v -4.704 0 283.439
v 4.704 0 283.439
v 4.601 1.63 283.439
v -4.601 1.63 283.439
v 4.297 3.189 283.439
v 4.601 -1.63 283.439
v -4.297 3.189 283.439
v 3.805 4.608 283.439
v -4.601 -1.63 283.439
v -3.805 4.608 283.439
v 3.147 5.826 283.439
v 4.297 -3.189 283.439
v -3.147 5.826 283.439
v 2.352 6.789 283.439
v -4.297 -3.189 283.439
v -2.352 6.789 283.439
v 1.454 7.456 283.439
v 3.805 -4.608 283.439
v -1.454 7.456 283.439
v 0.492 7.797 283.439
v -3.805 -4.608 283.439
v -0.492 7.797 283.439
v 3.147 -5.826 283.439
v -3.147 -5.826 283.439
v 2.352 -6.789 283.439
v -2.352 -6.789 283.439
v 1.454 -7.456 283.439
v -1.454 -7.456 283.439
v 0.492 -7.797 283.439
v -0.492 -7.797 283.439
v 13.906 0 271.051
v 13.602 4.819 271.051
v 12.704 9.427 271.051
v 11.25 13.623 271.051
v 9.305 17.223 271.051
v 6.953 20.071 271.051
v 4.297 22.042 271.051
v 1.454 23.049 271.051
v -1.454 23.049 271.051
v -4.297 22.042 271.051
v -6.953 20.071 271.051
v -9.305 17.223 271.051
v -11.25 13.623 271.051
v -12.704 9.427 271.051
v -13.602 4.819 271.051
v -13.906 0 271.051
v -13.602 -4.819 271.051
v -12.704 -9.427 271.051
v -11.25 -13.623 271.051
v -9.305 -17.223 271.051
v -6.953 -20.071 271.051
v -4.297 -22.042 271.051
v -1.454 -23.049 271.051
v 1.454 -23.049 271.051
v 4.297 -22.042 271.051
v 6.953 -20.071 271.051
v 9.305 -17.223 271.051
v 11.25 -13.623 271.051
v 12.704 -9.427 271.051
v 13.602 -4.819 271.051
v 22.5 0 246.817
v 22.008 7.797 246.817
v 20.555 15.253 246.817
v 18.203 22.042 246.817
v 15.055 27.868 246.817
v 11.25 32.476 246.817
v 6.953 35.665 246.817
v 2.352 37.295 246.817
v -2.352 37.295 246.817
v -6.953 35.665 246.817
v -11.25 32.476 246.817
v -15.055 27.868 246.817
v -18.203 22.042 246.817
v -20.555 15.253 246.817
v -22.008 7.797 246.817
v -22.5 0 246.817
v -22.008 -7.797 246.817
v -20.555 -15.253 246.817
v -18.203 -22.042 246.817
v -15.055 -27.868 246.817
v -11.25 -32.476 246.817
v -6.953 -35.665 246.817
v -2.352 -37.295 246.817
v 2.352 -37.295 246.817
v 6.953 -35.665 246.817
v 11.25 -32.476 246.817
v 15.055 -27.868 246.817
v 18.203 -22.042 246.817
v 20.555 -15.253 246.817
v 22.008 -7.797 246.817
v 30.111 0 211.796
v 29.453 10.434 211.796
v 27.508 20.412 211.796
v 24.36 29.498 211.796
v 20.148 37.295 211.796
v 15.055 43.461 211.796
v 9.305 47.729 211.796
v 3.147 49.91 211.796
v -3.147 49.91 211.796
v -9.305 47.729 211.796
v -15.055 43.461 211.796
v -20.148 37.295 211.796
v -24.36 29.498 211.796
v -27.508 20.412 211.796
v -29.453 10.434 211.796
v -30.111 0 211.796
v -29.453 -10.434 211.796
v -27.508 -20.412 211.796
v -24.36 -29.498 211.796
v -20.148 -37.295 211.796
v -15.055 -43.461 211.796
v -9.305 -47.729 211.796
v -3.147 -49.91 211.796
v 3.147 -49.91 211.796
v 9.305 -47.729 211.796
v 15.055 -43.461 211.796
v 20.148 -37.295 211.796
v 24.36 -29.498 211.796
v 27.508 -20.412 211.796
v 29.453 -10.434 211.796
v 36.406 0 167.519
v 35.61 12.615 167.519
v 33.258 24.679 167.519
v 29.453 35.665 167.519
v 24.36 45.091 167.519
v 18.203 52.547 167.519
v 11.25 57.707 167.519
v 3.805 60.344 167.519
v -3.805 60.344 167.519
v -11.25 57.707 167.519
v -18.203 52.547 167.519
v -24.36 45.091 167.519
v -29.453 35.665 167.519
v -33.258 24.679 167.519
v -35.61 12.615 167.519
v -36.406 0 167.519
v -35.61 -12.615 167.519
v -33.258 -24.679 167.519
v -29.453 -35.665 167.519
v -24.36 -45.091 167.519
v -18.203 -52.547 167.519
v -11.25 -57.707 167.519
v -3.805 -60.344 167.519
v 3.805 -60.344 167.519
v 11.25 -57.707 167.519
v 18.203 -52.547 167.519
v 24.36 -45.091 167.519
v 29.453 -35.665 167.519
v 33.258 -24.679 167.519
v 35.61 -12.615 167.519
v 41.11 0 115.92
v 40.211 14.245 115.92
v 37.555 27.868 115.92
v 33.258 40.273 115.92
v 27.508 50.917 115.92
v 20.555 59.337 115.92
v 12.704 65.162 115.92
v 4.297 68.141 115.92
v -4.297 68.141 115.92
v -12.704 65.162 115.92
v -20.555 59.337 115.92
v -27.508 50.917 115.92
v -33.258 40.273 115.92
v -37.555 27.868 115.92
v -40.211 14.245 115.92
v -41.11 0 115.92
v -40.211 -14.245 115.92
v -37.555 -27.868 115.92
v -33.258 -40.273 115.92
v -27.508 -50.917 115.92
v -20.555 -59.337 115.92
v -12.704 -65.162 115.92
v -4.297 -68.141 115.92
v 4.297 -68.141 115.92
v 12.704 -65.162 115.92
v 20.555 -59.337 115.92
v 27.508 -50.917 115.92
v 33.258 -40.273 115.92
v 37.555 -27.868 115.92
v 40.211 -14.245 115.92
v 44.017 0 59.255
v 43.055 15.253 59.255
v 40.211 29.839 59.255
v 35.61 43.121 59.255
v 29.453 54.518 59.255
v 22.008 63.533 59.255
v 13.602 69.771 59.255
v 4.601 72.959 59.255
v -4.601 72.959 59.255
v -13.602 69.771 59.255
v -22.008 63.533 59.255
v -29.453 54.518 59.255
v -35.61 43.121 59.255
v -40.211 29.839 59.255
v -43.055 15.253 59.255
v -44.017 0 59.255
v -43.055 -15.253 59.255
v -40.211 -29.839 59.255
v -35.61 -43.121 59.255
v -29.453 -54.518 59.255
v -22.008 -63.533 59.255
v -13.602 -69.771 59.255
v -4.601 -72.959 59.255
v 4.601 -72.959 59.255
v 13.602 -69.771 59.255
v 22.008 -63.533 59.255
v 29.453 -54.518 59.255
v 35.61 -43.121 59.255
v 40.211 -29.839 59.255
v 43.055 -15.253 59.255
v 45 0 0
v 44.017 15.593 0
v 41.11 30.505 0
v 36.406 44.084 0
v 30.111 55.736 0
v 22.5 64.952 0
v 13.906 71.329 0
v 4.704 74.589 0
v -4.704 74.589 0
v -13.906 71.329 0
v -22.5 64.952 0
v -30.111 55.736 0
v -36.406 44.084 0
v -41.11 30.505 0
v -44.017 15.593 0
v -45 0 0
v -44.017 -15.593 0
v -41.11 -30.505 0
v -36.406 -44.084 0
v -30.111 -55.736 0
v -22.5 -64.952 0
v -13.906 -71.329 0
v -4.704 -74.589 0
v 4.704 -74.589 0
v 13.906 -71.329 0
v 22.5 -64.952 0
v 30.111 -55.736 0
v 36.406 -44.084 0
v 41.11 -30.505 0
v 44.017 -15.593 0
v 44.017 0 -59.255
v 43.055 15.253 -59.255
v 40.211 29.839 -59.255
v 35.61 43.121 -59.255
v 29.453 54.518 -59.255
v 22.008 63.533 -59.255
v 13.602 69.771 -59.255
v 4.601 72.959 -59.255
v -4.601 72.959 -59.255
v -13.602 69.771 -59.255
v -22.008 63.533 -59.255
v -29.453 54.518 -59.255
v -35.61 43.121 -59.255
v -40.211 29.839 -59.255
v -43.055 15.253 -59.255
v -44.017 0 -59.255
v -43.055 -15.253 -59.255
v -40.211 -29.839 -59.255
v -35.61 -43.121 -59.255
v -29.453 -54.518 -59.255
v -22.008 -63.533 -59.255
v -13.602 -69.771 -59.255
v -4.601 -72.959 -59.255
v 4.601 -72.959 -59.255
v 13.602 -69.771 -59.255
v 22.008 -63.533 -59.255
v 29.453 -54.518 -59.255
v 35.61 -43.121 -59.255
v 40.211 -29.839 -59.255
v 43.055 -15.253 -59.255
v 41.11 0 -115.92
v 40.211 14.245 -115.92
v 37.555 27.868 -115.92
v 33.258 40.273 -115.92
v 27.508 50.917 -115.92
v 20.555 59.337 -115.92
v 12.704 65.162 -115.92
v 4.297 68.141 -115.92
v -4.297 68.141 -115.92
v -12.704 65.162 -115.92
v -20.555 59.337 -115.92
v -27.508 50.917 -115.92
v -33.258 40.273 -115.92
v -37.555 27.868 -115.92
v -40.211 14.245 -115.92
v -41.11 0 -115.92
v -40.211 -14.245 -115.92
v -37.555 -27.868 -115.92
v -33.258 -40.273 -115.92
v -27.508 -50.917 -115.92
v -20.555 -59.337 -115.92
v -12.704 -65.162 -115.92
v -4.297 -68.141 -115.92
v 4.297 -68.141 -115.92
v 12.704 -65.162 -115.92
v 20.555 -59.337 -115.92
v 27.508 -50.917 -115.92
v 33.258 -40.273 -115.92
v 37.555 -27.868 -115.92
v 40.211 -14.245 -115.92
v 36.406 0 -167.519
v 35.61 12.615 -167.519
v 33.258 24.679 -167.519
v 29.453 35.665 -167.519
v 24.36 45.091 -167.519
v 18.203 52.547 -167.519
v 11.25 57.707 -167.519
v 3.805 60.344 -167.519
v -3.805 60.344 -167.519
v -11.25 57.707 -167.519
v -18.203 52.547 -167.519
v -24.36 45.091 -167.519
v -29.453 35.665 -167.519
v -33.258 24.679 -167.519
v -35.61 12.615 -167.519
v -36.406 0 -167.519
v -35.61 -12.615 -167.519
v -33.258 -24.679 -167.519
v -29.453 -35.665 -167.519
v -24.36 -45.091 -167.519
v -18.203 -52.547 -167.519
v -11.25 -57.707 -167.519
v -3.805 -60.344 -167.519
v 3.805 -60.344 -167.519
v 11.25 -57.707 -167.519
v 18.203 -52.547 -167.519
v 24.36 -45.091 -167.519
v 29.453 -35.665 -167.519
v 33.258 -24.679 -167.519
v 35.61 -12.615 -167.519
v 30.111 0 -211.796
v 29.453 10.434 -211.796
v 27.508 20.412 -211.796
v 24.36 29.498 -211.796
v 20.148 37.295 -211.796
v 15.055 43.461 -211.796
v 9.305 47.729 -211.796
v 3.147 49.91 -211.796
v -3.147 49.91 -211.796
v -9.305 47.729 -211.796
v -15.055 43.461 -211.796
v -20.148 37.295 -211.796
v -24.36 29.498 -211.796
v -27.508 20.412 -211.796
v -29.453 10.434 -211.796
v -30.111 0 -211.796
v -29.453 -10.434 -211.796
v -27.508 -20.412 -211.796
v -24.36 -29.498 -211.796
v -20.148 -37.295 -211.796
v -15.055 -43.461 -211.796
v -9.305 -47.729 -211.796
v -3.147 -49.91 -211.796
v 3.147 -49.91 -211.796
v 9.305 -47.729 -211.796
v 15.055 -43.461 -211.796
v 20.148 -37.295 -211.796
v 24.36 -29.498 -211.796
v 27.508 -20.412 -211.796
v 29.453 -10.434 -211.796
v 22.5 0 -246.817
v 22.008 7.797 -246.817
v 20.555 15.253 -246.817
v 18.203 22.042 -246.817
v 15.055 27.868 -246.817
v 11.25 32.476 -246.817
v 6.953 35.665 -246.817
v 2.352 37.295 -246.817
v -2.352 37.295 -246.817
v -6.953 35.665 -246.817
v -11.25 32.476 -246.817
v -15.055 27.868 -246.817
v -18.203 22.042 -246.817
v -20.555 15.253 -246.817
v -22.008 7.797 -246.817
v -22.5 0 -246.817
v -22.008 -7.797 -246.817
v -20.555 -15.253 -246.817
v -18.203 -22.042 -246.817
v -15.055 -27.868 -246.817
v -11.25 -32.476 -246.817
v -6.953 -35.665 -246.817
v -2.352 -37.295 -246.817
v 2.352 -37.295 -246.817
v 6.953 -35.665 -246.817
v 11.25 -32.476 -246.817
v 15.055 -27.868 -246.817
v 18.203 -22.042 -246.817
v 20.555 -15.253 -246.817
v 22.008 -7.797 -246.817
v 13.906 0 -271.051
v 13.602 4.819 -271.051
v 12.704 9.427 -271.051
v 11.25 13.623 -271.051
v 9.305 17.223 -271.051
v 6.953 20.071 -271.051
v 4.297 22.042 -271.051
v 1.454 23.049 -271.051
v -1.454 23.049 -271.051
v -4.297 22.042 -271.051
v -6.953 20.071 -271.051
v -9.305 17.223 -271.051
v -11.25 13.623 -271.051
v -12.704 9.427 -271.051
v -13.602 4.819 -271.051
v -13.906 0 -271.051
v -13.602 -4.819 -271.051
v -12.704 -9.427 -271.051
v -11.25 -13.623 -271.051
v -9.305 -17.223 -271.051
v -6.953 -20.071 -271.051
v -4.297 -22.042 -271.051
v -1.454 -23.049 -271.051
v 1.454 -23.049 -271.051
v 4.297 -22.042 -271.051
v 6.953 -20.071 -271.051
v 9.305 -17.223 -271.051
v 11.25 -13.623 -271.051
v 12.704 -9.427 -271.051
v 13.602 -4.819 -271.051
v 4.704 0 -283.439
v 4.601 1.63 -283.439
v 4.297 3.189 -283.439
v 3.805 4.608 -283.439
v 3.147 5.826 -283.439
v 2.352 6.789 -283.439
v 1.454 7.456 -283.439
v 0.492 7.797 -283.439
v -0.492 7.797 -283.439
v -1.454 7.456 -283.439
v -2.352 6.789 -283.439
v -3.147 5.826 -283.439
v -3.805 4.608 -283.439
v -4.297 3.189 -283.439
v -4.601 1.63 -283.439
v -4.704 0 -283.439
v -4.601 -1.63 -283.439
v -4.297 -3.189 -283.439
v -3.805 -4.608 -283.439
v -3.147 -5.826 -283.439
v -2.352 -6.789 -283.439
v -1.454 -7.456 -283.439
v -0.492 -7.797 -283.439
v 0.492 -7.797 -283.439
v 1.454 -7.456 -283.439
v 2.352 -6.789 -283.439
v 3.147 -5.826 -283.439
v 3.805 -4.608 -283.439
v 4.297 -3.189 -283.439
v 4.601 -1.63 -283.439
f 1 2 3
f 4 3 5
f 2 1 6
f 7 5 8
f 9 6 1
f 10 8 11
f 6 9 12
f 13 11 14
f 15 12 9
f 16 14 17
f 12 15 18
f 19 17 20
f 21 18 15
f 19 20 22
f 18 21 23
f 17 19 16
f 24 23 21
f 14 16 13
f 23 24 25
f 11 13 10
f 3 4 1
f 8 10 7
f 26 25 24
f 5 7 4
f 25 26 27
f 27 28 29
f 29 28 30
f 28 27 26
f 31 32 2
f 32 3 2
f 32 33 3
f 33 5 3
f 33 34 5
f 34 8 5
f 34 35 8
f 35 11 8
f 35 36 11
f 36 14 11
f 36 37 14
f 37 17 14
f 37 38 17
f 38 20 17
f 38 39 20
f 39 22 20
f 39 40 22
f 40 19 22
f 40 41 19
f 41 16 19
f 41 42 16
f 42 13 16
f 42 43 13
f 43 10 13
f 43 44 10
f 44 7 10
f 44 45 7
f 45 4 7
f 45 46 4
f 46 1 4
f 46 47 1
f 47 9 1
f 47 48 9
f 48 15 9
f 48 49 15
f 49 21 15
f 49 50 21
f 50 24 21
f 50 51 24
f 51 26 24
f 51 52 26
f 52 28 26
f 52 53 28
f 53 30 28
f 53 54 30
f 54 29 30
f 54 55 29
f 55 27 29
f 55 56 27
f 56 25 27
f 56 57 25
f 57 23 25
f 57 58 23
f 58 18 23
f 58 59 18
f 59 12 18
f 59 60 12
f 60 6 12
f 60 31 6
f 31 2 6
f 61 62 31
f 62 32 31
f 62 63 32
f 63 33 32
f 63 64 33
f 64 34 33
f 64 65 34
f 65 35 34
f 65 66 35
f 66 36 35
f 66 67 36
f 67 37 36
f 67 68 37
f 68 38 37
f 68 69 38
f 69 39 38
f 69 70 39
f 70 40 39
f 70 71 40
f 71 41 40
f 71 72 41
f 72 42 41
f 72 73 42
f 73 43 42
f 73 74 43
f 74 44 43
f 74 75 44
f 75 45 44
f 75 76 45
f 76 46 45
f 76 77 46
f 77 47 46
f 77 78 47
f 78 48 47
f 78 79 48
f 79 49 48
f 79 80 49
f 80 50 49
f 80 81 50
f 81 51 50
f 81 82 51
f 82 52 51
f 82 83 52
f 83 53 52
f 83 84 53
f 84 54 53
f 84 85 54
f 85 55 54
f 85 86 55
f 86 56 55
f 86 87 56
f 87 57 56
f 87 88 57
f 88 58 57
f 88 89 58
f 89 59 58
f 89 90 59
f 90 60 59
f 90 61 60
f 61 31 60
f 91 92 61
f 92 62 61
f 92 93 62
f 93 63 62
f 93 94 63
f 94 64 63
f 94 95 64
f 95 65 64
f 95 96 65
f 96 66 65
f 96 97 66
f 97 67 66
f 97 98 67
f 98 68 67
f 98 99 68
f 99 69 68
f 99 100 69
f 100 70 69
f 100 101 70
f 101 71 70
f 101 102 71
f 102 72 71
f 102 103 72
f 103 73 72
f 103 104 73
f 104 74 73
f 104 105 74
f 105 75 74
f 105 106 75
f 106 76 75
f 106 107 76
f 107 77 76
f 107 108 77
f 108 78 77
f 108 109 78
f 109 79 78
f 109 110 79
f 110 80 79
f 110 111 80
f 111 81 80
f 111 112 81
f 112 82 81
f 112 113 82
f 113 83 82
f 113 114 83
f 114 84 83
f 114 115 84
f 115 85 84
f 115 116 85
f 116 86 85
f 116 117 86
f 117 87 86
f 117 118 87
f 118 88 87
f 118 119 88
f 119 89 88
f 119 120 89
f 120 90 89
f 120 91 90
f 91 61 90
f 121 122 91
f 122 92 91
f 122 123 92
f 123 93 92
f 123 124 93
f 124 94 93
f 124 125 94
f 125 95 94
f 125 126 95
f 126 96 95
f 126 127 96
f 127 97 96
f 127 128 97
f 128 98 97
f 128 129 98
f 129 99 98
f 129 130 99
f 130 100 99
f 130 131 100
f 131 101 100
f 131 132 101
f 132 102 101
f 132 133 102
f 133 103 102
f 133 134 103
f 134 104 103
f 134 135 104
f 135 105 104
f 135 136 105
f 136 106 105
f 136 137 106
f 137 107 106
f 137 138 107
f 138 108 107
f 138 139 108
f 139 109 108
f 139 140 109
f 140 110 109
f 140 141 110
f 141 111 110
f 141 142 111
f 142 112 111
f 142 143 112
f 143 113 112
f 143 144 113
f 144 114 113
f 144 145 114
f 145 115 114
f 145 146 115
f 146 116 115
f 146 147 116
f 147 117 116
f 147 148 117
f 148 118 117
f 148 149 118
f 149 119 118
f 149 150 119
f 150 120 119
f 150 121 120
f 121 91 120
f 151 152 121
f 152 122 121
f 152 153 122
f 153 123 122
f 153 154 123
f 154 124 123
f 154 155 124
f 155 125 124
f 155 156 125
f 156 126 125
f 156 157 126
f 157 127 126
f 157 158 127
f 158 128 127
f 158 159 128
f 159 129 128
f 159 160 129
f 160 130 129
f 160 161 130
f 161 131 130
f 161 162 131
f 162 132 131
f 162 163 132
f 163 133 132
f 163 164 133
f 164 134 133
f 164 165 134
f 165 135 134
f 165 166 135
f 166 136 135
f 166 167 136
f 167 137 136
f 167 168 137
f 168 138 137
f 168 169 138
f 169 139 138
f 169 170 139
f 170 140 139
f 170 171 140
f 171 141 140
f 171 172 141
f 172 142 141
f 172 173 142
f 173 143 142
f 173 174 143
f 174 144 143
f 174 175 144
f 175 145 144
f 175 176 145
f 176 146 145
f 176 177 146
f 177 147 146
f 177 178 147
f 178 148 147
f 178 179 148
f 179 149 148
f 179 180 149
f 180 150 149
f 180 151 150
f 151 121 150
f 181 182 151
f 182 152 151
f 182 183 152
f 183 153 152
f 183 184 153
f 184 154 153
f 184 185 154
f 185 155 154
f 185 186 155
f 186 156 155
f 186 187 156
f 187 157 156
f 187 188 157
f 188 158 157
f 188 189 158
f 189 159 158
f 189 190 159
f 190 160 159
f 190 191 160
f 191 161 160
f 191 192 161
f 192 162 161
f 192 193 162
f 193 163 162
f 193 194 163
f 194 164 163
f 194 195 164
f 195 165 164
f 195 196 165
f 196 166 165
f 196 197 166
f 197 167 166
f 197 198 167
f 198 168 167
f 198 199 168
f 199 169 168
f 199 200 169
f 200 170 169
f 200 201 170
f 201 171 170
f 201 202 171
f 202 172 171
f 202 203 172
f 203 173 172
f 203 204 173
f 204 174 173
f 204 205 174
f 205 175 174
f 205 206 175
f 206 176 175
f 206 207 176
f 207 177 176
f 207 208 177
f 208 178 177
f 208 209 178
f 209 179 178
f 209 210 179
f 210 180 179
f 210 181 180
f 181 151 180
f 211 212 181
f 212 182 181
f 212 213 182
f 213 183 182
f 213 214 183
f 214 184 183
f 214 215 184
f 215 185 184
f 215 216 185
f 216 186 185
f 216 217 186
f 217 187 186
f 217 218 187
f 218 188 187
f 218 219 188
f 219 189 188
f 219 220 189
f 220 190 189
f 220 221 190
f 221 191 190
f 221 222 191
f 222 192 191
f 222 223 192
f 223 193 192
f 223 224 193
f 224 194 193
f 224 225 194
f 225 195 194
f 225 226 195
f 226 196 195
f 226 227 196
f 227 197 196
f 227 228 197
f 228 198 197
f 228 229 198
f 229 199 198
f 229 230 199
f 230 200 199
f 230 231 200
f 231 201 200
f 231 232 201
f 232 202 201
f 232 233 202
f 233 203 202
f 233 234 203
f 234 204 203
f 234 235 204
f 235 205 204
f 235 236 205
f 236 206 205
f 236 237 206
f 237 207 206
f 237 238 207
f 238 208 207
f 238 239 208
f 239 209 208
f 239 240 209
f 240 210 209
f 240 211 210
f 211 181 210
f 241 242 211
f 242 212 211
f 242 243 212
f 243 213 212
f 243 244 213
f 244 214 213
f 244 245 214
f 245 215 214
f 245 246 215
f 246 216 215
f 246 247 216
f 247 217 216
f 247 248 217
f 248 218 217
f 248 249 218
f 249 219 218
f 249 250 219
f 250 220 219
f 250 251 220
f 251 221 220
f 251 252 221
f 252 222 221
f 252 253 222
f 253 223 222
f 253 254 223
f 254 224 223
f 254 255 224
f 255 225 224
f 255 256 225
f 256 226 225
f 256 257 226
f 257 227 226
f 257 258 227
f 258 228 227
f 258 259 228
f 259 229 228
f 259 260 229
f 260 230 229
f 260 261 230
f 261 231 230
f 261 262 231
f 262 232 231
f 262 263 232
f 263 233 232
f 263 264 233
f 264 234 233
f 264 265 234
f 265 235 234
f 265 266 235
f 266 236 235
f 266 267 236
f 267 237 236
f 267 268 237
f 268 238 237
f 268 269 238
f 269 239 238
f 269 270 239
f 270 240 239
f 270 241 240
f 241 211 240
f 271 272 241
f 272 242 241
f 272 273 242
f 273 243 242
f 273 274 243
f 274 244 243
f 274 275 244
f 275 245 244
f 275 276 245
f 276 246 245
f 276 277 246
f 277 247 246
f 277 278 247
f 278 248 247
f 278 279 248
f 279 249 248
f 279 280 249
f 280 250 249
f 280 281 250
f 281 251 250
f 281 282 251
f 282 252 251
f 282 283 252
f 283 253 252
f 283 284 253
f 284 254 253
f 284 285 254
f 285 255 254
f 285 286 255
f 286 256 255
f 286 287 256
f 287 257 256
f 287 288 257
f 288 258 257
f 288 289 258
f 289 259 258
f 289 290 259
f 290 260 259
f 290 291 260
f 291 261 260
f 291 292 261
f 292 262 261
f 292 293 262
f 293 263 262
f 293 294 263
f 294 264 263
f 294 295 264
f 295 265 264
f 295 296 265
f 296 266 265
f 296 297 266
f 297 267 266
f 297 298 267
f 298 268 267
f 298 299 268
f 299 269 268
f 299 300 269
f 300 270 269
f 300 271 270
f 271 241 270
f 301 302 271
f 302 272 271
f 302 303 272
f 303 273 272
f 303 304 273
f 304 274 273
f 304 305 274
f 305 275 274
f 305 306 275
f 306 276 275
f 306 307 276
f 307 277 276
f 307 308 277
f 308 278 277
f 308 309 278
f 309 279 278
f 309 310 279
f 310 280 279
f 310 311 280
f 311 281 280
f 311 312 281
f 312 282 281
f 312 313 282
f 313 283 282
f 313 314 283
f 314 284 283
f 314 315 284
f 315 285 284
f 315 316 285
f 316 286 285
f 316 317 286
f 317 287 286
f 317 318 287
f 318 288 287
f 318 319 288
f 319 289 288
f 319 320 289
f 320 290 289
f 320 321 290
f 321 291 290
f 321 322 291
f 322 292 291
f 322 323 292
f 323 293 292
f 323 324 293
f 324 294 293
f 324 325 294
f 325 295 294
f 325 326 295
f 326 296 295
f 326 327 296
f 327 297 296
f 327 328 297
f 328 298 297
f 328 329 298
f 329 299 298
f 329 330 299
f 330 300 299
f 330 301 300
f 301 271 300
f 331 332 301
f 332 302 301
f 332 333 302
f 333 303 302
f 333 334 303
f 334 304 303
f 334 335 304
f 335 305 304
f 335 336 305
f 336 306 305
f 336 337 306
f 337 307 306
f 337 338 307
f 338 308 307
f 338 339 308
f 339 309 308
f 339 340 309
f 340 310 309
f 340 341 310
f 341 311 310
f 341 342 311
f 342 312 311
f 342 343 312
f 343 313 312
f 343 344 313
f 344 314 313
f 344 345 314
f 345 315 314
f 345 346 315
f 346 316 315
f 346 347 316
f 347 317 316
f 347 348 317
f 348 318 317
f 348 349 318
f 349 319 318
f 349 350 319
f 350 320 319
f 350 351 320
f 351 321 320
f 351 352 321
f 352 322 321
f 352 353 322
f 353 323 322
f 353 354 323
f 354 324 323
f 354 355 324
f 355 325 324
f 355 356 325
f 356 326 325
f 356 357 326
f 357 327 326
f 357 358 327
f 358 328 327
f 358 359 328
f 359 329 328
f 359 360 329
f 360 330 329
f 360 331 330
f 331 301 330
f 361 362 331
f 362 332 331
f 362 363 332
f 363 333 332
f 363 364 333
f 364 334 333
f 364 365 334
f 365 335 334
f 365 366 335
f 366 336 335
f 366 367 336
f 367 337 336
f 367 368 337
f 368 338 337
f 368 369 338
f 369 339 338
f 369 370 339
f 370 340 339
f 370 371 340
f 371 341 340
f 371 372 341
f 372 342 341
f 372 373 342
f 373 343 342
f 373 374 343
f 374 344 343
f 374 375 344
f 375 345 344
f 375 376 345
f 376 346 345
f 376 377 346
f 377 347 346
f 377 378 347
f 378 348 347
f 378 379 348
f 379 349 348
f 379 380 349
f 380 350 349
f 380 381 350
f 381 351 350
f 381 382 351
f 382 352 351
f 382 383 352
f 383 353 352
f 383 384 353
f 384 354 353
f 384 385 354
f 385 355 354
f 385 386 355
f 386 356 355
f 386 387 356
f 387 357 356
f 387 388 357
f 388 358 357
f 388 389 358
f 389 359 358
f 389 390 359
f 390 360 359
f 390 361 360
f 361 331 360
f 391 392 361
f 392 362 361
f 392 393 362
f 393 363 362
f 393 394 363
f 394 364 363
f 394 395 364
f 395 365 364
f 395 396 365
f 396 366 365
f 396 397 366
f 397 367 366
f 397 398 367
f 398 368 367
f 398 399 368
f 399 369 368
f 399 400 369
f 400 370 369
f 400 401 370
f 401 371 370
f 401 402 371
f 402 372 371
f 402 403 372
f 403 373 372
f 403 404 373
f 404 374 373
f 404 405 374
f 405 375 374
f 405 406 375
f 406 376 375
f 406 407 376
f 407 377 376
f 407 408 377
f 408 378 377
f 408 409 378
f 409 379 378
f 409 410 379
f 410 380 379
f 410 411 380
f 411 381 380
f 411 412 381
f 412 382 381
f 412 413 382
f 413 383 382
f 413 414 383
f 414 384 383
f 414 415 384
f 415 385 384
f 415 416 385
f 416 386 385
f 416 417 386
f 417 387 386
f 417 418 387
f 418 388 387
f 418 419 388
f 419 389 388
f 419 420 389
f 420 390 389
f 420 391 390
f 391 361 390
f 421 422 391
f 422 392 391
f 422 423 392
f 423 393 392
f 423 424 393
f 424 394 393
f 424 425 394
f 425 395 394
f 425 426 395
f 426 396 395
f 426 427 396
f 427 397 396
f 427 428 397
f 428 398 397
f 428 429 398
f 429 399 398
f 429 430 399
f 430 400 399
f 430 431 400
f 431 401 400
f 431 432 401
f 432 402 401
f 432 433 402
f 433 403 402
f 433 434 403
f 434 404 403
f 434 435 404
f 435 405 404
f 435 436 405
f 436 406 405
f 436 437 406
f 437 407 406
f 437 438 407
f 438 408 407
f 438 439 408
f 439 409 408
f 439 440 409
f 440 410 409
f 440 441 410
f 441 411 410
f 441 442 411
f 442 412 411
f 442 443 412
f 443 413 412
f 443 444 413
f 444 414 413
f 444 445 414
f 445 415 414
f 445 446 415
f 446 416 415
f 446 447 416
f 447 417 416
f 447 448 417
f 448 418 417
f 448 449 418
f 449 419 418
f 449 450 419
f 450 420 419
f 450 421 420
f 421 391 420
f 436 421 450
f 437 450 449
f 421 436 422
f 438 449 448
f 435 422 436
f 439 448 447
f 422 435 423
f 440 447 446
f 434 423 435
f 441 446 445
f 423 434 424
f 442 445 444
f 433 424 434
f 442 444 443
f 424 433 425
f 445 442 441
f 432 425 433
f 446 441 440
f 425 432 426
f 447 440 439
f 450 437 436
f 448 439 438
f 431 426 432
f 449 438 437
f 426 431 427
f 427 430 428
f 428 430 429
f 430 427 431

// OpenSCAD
// Generated by SolidPython 1.0.1 on 2020-07-29 00:46:45


scale(v = [3, 5, 19]) {
	sphere(r = 15);
}
/***********************************************
*********      SolidPython code:      **********
************************************************
 
# import packages: SolidPython
from solid import *
from solid.utils import *
from itertools import chain, combinations, permutations


class Resize:

    def __init__(self, scad_file):
        self.scad_file = scad_file
        #self.scad_file = import_scad(scad_file)
        # cone/cylinder param:
        self.r1 = 0
        self.r2 = 0
        self.h = 0
        # rectangular prism param:
        self.w = 0
        self.l = 0
        # ellipse param:
        self.r = 0

    # import OpenScad code (file name corresponds to shape)


    # classify shape + parameters
    def assign(self, param1, param2, param3):
        if self.scad_file == 'cone.scad':
            self.r1 = param1
            self.r2 = param2
            self.h = param3
        elif self.scad_file == 'cylinder.scad':
            self.r1 = param1
            self.r2 = param2
            self.h = param3
        elif self.scad_file == 'rectangularPrism.scad':
            self.h = param1
            self.l = param2
            self.w = param3
        else:
            self.r = param1
            self.h = param2

    # resize parameters
    def iterate(self):
        x = range(3, 20, 2)
        i = 1
        if self.scad_file == 'cone.scad':
            tempList = list(permutations(x, 2))
            for temp in tempList:
                param1 = temp[0]
                param2 = temp[1]
                filepath = 'produced_scad_files/' + 'cone' + str(param1) + '_' + str(param2) + '_' + '.scad'
                scad_render_to_file(cylinder(h=param1, r1=param2, r2=0), filepath)

        elif self.scad_file == 'cylinder.scad':
            tempList = list(permutations(x, 3))
            for temp in tempList:
                param1 = temp[0]
                param2 = temp[1]
                filepath = 'produced_scad_files/' + 'cylinder' + str(param1) + '_' + str(param2) + '_' + '.scad'
                scad_render_to_file(cylinder(h=param1, r1=param2, r2=param2), filepath)

        elif self.scad_file == 'rectangularPrism.scad':
            tempList = list(permutations(x, 3))
            for temp in tempList:
                param1 = temp[0]
                param2 = temp[1]
                param3 = temp[2]
                filepath = 'produced_scad_files/' + 'rectangularPrism' + str(param1) + '_' + str(param2) + '_' + str(
                    param3) + '.scad'
                scad_render_to_file(cube(size=(param1, param2, param3)), filepath)

        elif self.scad_file == 'ellipse.scad':
            tempList = list(permutations(x, 4))
            for temp in tempList:
                param1 = temp[0]
                param2 = temp[1]
                param3 = temp[2]
                param4 = temp[3]
                filepath = 'produced_scad_files/' + 'ellipse' + str(param1) + '_' + str(param2) + '_' + str(param3) + '_' + str(param4) + '.scad'
                scad_render_to_file(scale([param1, param2, param3])(sphere(r=param4)), filepath)

    def render_to_scadfile(self):
        scad_render_to_file(scad, 'example.scad') 
 
************************************************/
